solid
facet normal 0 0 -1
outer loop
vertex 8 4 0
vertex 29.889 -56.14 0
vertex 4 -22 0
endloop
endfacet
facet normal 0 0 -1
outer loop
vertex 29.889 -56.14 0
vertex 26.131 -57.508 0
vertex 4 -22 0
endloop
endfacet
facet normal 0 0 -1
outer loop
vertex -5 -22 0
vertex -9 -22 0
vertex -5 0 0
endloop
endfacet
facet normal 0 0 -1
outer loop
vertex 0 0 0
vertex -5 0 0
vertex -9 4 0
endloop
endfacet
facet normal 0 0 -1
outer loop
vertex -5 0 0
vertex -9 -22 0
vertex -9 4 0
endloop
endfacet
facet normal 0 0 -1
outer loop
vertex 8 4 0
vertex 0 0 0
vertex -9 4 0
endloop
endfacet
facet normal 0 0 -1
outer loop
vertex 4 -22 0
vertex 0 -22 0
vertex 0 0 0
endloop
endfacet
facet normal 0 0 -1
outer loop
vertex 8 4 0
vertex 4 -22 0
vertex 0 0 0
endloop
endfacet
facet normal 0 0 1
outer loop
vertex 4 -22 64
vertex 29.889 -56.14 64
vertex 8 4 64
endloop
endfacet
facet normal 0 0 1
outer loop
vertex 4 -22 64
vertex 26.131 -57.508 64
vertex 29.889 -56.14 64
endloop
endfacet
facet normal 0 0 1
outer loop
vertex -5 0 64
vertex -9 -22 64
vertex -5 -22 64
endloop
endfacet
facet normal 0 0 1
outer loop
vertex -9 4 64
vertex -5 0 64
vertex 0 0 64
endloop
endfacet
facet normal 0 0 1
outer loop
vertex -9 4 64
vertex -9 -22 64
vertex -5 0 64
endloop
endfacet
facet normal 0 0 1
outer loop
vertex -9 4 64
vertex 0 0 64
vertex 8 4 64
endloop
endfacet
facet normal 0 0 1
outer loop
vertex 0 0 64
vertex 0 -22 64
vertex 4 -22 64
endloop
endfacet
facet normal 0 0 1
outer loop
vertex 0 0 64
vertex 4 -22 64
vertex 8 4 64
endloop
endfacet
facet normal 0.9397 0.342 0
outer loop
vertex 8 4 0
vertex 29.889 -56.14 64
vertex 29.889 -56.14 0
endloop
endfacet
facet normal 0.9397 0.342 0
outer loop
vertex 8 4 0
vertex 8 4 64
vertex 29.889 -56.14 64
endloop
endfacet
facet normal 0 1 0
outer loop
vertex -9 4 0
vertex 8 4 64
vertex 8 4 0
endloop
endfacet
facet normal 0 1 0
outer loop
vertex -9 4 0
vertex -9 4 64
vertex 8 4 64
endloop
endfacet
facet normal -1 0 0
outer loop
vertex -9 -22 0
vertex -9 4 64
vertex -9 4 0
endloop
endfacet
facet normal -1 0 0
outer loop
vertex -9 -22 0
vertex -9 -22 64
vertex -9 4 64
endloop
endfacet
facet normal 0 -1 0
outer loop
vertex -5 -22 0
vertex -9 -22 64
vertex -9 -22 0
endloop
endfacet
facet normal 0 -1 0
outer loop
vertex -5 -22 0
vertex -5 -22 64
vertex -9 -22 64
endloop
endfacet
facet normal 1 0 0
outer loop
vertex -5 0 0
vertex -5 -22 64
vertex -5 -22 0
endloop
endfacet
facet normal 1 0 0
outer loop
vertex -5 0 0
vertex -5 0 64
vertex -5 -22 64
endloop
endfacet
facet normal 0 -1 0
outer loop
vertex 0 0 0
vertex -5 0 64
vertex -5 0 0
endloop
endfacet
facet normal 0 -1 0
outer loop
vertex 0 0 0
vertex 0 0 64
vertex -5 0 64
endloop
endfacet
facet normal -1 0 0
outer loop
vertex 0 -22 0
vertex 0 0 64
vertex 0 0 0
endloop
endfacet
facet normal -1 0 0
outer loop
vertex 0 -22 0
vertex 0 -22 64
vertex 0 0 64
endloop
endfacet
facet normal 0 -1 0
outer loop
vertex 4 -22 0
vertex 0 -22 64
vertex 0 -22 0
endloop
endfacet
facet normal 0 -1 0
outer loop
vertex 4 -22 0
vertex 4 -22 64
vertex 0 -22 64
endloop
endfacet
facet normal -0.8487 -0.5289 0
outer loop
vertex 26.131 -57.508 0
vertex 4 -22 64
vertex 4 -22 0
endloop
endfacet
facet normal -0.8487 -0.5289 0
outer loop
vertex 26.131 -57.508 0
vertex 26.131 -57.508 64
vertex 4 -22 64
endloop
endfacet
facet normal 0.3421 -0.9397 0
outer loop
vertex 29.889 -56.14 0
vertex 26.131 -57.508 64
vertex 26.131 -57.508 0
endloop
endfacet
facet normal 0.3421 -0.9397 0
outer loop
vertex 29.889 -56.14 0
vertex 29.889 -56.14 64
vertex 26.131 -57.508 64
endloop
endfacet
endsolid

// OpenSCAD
// print: 側面をZ=0へ置く。mounted: X=左右、Y=手前、Z=上。
part = "print";
tilt_deg = 20; // 直立0度。正なら上端が棚側、下端が手前。
slit_width = 5;
slit_height = 22;
face_size = 64;
wall = 4;

assert(part == "print" || part == "mounted");
assert(tilt_deg >= 0 && tilt_deg <= 45, "tilt_deg must be 0..45");
assert(slit_width > 0 && slit_height > 0 && wall > 0);
assert(face_size >= 61 && slit_height < face_size * cos(tilt_deg));

// 断面の座標は[手前, 上]。スリットの天井が高さ0、開口端が-slit_height。
top = [2 * wall, wall];
bottom = top + face_size * [sin(tilt_deg), -cos(tilt_deg)];
back_bottom = bottom - wall * [cos(tilt_deg), sin(tilt_deg)];

module holder() {
  linear_extrude(height = face_size)
    polygon([
      [-slit_width - wall, -slit_height],
      [-slit_width, -slit_height], [-slit_width, 0], [0, 0],
      [0, -slit_height], [wall, -slit_height],
      back_bottom, bottom, top, [-slit_width - wall, wall]
    ]);
}

if (part == "mounted")
  multmatrix([[0, 0, 1, -face_size / 2], [1, 0, 0, 0], [0, 1, 0, 0], [0, 0, 0, 1]])
    holder();
else
  holder();
